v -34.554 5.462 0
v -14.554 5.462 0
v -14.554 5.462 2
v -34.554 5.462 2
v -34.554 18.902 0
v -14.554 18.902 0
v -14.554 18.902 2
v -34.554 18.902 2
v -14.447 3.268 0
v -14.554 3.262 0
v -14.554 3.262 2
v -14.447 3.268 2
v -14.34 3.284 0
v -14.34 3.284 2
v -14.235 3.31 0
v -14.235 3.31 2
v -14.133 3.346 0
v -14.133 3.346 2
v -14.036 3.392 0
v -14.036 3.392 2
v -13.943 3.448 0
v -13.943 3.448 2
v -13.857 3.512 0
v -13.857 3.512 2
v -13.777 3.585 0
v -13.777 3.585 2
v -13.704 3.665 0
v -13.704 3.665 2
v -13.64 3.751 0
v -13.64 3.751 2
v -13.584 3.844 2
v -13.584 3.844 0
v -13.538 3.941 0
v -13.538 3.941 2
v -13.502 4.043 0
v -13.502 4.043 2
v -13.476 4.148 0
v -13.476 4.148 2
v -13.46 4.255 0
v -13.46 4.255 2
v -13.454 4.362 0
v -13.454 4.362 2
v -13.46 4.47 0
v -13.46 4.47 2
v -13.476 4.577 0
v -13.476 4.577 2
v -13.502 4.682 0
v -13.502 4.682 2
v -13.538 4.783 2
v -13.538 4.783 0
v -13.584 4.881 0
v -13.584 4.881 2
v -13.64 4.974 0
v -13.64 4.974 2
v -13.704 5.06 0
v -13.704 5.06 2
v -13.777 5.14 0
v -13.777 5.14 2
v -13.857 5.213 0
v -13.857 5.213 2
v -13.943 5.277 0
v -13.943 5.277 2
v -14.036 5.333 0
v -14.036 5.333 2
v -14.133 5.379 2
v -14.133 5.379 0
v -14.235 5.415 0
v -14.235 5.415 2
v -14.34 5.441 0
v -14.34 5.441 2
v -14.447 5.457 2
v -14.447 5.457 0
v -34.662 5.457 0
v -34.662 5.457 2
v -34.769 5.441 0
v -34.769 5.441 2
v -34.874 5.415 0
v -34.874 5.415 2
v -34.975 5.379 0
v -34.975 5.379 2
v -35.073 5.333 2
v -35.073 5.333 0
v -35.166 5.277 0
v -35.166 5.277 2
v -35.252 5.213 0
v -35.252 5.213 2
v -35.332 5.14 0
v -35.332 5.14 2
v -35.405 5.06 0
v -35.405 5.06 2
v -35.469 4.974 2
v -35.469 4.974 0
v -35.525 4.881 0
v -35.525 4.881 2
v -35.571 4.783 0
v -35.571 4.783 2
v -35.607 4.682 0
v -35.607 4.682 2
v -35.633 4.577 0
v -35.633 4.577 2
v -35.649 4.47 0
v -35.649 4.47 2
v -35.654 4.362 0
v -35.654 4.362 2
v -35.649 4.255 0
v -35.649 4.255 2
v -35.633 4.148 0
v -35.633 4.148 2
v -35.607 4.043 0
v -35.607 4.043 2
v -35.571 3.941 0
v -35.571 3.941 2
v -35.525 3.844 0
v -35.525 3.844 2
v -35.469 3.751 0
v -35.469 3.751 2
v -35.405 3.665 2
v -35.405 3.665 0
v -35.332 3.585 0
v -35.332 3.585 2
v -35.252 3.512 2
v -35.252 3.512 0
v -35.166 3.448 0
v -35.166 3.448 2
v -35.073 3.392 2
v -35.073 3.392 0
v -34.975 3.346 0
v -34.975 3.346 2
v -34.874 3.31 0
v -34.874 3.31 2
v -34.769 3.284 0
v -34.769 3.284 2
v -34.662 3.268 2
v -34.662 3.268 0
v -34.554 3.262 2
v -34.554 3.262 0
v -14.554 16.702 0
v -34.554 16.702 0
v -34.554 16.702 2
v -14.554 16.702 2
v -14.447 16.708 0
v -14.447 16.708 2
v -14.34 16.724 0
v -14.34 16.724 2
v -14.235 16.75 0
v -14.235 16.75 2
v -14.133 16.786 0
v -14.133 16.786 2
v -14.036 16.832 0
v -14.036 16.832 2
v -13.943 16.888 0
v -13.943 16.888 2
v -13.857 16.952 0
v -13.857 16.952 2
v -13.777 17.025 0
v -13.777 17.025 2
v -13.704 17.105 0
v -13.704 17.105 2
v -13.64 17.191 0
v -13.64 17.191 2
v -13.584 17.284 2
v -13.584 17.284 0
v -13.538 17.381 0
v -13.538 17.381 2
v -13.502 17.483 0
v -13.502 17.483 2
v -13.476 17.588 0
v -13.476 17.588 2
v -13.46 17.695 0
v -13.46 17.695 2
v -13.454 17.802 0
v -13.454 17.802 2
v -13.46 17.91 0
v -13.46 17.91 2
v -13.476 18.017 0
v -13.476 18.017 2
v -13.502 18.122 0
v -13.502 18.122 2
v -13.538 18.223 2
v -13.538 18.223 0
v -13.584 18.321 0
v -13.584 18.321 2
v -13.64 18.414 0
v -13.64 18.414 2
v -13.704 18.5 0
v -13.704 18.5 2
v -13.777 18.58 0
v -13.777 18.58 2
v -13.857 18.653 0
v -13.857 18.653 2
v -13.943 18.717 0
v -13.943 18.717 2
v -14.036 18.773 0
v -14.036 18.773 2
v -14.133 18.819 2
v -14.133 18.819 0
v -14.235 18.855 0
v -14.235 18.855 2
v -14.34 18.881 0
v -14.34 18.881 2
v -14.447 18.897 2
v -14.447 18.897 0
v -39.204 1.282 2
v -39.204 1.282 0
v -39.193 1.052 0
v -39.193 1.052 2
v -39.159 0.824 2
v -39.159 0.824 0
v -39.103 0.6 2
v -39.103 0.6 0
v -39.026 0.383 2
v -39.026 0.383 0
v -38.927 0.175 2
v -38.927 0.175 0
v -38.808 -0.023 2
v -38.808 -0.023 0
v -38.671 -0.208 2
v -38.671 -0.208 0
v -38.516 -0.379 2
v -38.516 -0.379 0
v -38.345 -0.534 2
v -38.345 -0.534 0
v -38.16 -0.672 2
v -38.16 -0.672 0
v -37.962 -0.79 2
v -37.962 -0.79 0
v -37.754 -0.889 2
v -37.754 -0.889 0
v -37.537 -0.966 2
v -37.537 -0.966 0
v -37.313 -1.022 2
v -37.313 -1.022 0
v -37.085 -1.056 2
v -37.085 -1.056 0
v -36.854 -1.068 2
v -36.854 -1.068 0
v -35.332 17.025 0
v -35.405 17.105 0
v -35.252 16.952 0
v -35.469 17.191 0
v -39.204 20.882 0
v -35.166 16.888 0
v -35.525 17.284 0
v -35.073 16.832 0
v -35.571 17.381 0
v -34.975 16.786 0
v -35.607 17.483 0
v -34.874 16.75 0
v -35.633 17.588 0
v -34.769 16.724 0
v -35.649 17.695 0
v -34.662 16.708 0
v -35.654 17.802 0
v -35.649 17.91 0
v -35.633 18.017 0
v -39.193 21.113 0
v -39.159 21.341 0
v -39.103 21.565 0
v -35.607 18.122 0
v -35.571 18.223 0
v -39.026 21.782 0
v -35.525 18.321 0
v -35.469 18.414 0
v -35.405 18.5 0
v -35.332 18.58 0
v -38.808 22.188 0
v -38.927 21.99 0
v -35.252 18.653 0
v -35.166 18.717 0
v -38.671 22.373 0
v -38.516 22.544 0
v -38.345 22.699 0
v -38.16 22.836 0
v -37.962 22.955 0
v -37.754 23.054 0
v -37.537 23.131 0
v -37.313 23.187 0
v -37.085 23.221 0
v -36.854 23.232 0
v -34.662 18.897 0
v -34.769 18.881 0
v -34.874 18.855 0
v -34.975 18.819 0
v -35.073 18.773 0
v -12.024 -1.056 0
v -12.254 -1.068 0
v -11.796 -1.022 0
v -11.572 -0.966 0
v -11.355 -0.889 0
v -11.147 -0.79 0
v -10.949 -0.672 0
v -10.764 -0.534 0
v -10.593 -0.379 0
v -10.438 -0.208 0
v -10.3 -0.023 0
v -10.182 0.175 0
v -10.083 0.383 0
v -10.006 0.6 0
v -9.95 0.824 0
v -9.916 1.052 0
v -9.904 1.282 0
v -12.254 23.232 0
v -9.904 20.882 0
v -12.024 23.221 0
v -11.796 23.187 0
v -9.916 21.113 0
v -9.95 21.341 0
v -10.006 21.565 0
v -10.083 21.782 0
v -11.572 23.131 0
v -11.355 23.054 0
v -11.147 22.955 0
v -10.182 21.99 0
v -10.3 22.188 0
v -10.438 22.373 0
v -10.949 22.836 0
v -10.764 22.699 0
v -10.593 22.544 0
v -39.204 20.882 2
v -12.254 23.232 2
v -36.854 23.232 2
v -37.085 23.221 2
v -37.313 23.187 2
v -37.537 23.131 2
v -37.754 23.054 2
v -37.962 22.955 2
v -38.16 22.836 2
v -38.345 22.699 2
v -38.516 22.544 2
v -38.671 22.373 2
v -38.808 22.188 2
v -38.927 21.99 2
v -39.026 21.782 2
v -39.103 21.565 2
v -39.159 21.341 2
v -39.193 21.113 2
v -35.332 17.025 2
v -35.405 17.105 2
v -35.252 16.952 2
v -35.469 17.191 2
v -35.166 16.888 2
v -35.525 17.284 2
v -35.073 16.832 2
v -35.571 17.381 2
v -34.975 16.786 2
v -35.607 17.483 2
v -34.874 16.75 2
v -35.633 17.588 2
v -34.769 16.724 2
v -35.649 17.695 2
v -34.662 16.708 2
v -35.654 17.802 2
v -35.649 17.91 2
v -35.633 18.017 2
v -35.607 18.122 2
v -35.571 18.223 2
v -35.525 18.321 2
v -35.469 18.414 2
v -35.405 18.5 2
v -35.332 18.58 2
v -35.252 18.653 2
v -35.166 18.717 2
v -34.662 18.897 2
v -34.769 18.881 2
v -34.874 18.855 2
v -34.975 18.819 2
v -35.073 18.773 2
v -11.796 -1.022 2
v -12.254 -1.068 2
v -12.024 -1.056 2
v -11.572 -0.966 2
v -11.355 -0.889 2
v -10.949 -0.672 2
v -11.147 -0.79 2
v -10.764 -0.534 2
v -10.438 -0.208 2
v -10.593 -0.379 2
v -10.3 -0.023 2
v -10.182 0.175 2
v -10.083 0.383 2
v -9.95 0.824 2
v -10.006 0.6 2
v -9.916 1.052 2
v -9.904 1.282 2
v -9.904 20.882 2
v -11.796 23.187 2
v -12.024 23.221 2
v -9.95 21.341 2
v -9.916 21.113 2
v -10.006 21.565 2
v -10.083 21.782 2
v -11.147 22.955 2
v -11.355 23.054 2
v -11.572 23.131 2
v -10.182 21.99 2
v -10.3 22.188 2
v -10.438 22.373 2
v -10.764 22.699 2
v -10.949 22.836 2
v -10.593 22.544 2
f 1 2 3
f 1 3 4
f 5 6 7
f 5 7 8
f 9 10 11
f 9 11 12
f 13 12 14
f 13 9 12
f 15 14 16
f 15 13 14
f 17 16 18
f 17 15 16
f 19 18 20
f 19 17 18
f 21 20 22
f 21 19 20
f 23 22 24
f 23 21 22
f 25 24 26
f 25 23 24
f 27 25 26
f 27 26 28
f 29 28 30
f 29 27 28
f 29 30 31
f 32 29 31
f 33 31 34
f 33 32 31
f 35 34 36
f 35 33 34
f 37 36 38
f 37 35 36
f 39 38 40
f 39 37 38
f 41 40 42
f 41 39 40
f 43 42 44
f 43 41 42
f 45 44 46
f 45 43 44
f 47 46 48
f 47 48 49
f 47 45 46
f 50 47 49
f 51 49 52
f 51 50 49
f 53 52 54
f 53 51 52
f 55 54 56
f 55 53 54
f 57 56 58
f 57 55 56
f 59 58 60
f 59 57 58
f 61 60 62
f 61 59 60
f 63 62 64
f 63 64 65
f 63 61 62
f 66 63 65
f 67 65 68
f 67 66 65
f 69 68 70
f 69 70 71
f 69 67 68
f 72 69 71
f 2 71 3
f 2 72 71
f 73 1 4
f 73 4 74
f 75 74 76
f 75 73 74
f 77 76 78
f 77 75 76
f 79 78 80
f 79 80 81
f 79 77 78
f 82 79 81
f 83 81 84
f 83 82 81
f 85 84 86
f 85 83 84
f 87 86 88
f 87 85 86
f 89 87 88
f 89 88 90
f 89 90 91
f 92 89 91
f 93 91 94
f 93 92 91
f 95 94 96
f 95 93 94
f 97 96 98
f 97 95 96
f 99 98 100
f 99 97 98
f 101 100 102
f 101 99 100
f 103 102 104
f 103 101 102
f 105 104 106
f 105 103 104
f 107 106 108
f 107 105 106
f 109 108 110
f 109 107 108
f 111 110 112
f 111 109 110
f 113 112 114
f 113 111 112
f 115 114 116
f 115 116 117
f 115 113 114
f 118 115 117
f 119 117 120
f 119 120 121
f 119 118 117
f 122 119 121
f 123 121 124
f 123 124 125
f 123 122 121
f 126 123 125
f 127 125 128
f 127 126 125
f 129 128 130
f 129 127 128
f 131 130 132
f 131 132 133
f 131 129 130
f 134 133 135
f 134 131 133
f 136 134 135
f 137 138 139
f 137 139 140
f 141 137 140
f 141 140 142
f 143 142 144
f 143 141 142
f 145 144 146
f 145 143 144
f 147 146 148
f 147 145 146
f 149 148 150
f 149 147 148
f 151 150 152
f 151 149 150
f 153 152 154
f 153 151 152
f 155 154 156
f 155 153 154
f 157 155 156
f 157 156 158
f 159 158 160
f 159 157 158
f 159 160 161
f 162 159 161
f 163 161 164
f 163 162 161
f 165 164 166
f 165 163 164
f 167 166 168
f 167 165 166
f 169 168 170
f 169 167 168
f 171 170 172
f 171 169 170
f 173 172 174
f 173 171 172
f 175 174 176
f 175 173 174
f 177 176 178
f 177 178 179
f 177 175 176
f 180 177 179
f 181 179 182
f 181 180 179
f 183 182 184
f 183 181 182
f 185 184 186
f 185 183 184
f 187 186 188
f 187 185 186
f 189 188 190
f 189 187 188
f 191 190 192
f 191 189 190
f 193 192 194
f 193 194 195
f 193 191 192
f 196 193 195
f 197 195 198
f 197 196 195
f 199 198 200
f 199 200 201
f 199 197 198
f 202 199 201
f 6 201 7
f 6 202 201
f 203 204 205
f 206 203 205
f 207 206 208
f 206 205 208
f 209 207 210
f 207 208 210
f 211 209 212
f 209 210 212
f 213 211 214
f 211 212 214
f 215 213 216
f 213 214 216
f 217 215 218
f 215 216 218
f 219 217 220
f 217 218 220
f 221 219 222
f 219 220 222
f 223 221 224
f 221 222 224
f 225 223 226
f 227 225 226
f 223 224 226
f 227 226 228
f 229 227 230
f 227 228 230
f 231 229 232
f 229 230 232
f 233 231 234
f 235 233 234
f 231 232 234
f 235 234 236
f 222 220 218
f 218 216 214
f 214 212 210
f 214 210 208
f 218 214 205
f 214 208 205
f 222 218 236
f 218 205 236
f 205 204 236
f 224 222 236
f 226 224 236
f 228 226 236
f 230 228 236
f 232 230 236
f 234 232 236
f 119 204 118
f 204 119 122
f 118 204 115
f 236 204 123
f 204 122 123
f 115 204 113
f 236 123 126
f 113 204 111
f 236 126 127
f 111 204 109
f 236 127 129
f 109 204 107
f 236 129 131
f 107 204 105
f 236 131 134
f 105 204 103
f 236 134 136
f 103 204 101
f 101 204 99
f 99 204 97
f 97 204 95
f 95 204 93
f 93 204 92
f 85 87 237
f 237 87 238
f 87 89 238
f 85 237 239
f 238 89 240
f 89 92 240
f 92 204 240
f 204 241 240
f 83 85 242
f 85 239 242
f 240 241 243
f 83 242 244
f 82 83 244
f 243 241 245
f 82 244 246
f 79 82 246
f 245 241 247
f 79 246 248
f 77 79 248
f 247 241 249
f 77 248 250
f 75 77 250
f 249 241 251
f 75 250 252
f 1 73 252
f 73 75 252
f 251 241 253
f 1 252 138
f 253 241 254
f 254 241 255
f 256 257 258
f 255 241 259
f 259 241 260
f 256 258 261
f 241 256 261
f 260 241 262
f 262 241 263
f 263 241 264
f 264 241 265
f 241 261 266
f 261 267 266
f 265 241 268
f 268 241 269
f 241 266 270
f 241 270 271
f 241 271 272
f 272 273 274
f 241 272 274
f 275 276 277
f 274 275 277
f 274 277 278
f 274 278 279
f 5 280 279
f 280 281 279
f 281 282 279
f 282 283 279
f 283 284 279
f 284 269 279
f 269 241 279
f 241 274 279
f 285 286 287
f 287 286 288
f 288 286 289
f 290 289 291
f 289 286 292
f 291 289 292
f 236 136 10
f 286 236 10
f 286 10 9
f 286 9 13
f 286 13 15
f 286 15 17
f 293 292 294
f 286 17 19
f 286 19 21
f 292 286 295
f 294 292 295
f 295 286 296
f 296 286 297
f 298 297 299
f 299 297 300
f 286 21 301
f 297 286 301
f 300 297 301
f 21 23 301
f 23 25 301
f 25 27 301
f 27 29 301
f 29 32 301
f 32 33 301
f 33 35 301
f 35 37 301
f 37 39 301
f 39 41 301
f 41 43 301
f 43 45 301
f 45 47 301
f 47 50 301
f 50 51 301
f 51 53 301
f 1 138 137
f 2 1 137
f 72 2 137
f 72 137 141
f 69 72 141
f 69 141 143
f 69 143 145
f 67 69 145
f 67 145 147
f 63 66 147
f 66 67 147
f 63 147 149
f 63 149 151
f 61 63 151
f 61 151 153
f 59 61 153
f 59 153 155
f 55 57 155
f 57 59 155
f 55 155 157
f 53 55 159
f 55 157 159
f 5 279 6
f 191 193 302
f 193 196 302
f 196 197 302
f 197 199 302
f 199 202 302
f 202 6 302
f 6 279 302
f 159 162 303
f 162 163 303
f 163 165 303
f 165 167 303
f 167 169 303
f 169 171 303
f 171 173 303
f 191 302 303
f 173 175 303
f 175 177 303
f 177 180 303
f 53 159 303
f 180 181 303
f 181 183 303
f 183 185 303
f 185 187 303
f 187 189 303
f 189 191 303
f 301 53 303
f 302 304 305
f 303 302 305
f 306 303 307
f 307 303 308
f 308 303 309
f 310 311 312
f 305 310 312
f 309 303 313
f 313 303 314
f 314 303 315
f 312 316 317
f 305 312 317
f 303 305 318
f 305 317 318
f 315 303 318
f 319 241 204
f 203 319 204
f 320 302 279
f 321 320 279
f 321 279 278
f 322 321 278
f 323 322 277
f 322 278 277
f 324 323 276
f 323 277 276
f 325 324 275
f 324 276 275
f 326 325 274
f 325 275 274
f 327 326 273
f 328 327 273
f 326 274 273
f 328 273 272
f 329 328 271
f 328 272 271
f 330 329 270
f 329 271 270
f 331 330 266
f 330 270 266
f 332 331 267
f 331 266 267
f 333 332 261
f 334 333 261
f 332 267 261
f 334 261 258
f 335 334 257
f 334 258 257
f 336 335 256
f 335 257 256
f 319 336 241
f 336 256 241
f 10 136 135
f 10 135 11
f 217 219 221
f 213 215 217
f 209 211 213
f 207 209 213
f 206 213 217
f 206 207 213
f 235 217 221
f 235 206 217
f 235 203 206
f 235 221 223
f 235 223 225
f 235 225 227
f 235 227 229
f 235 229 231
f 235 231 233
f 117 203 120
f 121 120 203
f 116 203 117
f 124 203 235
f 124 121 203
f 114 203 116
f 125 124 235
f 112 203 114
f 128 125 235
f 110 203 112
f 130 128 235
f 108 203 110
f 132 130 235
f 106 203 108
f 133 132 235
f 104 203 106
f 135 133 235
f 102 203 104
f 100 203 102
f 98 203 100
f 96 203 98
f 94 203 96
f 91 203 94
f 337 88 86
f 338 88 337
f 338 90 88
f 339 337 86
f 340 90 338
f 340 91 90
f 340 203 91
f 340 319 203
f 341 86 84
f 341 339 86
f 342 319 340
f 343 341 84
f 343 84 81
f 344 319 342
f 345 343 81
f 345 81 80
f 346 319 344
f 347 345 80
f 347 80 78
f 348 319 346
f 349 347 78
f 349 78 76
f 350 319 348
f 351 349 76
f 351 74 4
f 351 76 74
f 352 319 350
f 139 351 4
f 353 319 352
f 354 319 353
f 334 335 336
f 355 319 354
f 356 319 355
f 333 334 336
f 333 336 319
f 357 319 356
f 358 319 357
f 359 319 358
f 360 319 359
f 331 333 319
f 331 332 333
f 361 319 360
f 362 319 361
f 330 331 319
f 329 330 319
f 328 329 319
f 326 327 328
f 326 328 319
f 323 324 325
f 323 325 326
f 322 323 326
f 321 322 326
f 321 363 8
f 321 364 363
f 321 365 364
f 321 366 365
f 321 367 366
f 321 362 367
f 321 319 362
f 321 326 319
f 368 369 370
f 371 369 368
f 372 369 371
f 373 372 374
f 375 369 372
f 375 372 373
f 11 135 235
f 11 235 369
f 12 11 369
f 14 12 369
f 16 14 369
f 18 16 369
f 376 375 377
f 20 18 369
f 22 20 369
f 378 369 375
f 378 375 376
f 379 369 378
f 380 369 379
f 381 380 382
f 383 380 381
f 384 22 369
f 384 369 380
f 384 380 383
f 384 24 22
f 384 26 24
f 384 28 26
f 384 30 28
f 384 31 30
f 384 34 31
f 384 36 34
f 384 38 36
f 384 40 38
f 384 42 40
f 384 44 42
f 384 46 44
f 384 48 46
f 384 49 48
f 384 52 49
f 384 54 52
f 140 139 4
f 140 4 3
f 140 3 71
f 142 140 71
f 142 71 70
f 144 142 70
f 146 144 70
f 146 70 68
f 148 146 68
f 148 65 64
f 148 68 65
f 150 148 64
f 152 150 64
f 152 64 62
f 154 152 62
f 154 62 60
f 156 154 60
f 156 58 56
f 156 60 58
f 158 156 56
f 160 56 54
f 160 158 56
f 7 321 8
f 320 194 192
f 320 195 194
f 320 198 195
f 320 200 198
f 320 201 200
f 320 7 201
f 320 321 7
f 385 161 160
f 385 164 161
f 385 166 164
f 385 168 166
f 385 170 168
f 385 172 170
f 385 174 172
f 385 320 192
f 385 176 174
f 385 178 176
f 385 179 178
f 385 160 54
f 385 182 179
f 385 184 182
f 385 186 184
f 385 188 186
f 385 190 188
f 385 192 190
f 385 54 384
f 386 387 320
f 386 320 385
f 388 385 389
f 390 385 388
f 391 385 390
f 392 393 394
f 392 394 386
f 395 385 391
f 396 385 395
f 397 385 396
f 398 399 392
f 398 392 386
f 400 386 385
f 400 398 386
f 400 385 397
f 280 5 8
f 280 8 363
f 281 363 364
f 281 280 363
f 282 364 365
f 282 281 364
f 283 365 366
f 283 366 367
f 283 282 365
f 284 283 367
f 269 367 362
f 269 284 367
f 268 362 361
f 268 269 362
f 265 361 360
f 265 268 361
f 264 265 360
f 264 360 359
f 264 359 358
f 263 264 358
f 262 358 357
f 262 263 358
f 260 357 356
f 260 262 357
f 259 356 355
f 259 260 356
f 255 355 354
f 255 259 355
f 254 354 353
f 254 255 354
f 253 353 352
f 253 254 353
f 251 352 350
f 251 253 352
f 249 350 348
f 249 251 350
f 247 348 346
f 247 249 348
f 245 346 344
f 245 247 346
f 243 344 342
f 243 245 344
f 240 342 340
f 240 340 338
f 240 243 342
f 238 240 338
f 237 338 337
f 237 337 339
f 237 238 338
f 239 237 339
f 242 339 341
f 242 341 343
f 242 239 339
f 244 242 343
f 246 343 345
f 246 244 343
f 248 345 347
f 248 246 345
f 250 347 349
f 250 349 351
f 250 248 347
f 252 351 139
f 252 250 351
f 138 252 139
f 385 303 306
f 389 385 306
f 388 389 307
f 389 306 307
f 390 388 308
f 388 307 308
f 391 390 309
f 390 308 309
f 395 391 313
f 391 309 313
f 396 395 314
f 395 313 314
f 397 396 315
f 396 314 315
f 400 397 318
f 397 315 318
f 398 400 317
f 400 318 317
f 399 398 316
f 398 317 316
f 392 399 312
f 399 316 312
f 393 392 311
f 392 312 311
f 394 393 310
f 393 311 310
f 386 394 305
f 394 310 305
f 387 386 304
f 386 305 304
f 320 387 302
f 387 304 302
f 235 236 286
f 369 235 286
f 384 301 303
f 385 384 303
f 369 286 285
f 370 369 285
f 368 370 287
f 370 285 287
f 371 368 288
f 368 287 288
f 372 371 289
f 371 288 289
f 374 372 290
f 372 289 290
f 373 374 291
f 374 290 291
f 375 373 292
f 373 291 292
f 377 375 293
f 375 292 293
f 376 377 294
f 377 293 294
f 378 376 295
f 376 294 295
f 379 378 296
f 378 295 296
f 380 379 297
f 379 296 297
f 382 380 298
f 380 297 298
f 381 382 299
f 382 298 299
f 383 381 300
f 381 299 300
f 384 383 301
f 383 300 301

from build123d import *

# Parameters (mm, degrees)
SALIENTE_EXTRUIR1_DEPTH = 2
CORTAR_EXTRUIR1_START   = -2
CORTAR_EXTRUIR1_DEPTH   = 2


with BuildPart() as part:
    # Croquis1 → Saliente-Extruir1 (new body)
    with BuildSketch(Plane.XY):
        with BuildLine():
            Line((-39.554396855, 20.88242961), (-39.554396855, 1.28242961))
            ThreePointArc((-39.554396855, 1.28242961), (-38.763585164, -0.626758699), (-36.854396855, -1.41757039))
            Line((-36.854396855, -1.41757039), (-12.254396855, -1.41757039))
            ThreePointArc((-12.254396855, -1.41757039), (-10.345208546, -0.626758699), (-9.554396855, 1.28242961))
            Line((-9.554396855, 1.28242961), (-9.554396855, 20.88242961))
            ThreePointArc((-9.554396855, 20.88242961), (-10.345208546, 22.791617919), (-12.254396855, 23.58242961))
            Line((-12.254396855, 23.58242961), (-36.854396855, 23.58242961))
            ThreePointArc((-36.854396855, 23.58242961), (-38.763585164, 22.791617919), (-39.554396855, 20.88242961))
        make_face()
        with BuildLine():
            Line((-14.554396855, 18.90242961), (-34.554396855, 18.90242961))
            ThreePointArc((-34.554396855, 18.90242961), (-35.654396855, 17.80242961), (-34.554396855, 16.70242961))
            Line((-34.554396855, 16.70242961), (-14.554396855, 16.70242961))
            ThreePointArc((-14.554396855, 16.70242961), (-13.454396855, 17.80242961), (-14.554396855, 18.90242961))
        make_face(mode=Mode.SUBTRACT)
        with BuildLine():
            Line((-34.554396855, 3.26242961), (-14.554396855, 3.26242961))
            ThreePointArc((-14.554396855, 3.26242961), (-13.454396855, 4.36242961), (-14.554396855, 5.46242961))
            Line((-14.554396855, 5.46242961), (-34.554396855, 5.46242961))
            ThreePointArc((-34.554396855, 5.46242961), (-35.654396855, 4.36242961), (-34.554396855, 3.26242961))
        make_face(mode=Mode.SUBTRACT)
    extrude(amount=SALIENTE_EXTRUIR1_DEPTH)

    # Croquis2 → Cortar-Extruir1 (cut)
    with BuildSketch(Plane.XY.offset(2).offset(CORTAR_EXTRUIR1_START)):
        with BuildLine():
            Line((-39.554396855, 20.88242961), (-39.554396855, 1.28242961))
            ThreePointArc((-39.554396855, 1.28242961), (-38.763585164, -0.626758699), (-36.854396855, -1.41757039))
            Line((-36.854396855, -1.41757039), (-12.254396855, -1.41757039))
            ThreePointArc((-12.254396855, -1.41757039), (-10.345208546, -0.626758699), (-9.554396855, 1.28242961))
            Line((-9.554396855, 1.28242961), (-9.554396855, 20.88242961))
            ThreePointArc((-9.554396855, 20.88242961), (-10.345208546, 22.791617919), (-12.254396855, 23.58242961))
            Line((-12.254396855, 23.58242961), (-36.854396855, 23.58242961))
            ThreePointArc((-36.854396855, 23.58242961), (-38.763585164, 22.791617919), (-39.554396855, 20.88242961))
        make_face()
        with BuildLine():
            Line((-39.204396855, 20.88242961), (-39.204396855, 1.28242961))
            ThreePointArc((-39.204396855, 1.28242961), (-38.516097791, -0.379271326), (-36.854396855, -1.06757039))
            Line((-36.854396855, -1.06757039), (-12.254396855, -1.06757039))
            ThreePointArc((-12.254396855, -1.06757039), (-10.592695919, -0.379271326), (-9.904396855, 1.28242961))
            Line((-9.904396855, 1.28242961), (-9.904396855, 20.88242961))
            ThreePointArc((-9.904396855, 20.88242961), (-10.592695919, 22.544130546), (-12.254396855, 23.23242961))
            Line((-12.254396855, 23.23242961), (-36.854396855, 23.23242961))
            ThreePointArc((-36.854396855, 23.23242961), (-38.516097791, 22.544130546), (-39.204396855, 20.88242961))
        make_face(mode=Mode.SUBTRACT)
    extrude(amount=CORTAR_EXTRUIR1_DEPTH, mode=Mode.SUBTRACT)


solid = part.part
